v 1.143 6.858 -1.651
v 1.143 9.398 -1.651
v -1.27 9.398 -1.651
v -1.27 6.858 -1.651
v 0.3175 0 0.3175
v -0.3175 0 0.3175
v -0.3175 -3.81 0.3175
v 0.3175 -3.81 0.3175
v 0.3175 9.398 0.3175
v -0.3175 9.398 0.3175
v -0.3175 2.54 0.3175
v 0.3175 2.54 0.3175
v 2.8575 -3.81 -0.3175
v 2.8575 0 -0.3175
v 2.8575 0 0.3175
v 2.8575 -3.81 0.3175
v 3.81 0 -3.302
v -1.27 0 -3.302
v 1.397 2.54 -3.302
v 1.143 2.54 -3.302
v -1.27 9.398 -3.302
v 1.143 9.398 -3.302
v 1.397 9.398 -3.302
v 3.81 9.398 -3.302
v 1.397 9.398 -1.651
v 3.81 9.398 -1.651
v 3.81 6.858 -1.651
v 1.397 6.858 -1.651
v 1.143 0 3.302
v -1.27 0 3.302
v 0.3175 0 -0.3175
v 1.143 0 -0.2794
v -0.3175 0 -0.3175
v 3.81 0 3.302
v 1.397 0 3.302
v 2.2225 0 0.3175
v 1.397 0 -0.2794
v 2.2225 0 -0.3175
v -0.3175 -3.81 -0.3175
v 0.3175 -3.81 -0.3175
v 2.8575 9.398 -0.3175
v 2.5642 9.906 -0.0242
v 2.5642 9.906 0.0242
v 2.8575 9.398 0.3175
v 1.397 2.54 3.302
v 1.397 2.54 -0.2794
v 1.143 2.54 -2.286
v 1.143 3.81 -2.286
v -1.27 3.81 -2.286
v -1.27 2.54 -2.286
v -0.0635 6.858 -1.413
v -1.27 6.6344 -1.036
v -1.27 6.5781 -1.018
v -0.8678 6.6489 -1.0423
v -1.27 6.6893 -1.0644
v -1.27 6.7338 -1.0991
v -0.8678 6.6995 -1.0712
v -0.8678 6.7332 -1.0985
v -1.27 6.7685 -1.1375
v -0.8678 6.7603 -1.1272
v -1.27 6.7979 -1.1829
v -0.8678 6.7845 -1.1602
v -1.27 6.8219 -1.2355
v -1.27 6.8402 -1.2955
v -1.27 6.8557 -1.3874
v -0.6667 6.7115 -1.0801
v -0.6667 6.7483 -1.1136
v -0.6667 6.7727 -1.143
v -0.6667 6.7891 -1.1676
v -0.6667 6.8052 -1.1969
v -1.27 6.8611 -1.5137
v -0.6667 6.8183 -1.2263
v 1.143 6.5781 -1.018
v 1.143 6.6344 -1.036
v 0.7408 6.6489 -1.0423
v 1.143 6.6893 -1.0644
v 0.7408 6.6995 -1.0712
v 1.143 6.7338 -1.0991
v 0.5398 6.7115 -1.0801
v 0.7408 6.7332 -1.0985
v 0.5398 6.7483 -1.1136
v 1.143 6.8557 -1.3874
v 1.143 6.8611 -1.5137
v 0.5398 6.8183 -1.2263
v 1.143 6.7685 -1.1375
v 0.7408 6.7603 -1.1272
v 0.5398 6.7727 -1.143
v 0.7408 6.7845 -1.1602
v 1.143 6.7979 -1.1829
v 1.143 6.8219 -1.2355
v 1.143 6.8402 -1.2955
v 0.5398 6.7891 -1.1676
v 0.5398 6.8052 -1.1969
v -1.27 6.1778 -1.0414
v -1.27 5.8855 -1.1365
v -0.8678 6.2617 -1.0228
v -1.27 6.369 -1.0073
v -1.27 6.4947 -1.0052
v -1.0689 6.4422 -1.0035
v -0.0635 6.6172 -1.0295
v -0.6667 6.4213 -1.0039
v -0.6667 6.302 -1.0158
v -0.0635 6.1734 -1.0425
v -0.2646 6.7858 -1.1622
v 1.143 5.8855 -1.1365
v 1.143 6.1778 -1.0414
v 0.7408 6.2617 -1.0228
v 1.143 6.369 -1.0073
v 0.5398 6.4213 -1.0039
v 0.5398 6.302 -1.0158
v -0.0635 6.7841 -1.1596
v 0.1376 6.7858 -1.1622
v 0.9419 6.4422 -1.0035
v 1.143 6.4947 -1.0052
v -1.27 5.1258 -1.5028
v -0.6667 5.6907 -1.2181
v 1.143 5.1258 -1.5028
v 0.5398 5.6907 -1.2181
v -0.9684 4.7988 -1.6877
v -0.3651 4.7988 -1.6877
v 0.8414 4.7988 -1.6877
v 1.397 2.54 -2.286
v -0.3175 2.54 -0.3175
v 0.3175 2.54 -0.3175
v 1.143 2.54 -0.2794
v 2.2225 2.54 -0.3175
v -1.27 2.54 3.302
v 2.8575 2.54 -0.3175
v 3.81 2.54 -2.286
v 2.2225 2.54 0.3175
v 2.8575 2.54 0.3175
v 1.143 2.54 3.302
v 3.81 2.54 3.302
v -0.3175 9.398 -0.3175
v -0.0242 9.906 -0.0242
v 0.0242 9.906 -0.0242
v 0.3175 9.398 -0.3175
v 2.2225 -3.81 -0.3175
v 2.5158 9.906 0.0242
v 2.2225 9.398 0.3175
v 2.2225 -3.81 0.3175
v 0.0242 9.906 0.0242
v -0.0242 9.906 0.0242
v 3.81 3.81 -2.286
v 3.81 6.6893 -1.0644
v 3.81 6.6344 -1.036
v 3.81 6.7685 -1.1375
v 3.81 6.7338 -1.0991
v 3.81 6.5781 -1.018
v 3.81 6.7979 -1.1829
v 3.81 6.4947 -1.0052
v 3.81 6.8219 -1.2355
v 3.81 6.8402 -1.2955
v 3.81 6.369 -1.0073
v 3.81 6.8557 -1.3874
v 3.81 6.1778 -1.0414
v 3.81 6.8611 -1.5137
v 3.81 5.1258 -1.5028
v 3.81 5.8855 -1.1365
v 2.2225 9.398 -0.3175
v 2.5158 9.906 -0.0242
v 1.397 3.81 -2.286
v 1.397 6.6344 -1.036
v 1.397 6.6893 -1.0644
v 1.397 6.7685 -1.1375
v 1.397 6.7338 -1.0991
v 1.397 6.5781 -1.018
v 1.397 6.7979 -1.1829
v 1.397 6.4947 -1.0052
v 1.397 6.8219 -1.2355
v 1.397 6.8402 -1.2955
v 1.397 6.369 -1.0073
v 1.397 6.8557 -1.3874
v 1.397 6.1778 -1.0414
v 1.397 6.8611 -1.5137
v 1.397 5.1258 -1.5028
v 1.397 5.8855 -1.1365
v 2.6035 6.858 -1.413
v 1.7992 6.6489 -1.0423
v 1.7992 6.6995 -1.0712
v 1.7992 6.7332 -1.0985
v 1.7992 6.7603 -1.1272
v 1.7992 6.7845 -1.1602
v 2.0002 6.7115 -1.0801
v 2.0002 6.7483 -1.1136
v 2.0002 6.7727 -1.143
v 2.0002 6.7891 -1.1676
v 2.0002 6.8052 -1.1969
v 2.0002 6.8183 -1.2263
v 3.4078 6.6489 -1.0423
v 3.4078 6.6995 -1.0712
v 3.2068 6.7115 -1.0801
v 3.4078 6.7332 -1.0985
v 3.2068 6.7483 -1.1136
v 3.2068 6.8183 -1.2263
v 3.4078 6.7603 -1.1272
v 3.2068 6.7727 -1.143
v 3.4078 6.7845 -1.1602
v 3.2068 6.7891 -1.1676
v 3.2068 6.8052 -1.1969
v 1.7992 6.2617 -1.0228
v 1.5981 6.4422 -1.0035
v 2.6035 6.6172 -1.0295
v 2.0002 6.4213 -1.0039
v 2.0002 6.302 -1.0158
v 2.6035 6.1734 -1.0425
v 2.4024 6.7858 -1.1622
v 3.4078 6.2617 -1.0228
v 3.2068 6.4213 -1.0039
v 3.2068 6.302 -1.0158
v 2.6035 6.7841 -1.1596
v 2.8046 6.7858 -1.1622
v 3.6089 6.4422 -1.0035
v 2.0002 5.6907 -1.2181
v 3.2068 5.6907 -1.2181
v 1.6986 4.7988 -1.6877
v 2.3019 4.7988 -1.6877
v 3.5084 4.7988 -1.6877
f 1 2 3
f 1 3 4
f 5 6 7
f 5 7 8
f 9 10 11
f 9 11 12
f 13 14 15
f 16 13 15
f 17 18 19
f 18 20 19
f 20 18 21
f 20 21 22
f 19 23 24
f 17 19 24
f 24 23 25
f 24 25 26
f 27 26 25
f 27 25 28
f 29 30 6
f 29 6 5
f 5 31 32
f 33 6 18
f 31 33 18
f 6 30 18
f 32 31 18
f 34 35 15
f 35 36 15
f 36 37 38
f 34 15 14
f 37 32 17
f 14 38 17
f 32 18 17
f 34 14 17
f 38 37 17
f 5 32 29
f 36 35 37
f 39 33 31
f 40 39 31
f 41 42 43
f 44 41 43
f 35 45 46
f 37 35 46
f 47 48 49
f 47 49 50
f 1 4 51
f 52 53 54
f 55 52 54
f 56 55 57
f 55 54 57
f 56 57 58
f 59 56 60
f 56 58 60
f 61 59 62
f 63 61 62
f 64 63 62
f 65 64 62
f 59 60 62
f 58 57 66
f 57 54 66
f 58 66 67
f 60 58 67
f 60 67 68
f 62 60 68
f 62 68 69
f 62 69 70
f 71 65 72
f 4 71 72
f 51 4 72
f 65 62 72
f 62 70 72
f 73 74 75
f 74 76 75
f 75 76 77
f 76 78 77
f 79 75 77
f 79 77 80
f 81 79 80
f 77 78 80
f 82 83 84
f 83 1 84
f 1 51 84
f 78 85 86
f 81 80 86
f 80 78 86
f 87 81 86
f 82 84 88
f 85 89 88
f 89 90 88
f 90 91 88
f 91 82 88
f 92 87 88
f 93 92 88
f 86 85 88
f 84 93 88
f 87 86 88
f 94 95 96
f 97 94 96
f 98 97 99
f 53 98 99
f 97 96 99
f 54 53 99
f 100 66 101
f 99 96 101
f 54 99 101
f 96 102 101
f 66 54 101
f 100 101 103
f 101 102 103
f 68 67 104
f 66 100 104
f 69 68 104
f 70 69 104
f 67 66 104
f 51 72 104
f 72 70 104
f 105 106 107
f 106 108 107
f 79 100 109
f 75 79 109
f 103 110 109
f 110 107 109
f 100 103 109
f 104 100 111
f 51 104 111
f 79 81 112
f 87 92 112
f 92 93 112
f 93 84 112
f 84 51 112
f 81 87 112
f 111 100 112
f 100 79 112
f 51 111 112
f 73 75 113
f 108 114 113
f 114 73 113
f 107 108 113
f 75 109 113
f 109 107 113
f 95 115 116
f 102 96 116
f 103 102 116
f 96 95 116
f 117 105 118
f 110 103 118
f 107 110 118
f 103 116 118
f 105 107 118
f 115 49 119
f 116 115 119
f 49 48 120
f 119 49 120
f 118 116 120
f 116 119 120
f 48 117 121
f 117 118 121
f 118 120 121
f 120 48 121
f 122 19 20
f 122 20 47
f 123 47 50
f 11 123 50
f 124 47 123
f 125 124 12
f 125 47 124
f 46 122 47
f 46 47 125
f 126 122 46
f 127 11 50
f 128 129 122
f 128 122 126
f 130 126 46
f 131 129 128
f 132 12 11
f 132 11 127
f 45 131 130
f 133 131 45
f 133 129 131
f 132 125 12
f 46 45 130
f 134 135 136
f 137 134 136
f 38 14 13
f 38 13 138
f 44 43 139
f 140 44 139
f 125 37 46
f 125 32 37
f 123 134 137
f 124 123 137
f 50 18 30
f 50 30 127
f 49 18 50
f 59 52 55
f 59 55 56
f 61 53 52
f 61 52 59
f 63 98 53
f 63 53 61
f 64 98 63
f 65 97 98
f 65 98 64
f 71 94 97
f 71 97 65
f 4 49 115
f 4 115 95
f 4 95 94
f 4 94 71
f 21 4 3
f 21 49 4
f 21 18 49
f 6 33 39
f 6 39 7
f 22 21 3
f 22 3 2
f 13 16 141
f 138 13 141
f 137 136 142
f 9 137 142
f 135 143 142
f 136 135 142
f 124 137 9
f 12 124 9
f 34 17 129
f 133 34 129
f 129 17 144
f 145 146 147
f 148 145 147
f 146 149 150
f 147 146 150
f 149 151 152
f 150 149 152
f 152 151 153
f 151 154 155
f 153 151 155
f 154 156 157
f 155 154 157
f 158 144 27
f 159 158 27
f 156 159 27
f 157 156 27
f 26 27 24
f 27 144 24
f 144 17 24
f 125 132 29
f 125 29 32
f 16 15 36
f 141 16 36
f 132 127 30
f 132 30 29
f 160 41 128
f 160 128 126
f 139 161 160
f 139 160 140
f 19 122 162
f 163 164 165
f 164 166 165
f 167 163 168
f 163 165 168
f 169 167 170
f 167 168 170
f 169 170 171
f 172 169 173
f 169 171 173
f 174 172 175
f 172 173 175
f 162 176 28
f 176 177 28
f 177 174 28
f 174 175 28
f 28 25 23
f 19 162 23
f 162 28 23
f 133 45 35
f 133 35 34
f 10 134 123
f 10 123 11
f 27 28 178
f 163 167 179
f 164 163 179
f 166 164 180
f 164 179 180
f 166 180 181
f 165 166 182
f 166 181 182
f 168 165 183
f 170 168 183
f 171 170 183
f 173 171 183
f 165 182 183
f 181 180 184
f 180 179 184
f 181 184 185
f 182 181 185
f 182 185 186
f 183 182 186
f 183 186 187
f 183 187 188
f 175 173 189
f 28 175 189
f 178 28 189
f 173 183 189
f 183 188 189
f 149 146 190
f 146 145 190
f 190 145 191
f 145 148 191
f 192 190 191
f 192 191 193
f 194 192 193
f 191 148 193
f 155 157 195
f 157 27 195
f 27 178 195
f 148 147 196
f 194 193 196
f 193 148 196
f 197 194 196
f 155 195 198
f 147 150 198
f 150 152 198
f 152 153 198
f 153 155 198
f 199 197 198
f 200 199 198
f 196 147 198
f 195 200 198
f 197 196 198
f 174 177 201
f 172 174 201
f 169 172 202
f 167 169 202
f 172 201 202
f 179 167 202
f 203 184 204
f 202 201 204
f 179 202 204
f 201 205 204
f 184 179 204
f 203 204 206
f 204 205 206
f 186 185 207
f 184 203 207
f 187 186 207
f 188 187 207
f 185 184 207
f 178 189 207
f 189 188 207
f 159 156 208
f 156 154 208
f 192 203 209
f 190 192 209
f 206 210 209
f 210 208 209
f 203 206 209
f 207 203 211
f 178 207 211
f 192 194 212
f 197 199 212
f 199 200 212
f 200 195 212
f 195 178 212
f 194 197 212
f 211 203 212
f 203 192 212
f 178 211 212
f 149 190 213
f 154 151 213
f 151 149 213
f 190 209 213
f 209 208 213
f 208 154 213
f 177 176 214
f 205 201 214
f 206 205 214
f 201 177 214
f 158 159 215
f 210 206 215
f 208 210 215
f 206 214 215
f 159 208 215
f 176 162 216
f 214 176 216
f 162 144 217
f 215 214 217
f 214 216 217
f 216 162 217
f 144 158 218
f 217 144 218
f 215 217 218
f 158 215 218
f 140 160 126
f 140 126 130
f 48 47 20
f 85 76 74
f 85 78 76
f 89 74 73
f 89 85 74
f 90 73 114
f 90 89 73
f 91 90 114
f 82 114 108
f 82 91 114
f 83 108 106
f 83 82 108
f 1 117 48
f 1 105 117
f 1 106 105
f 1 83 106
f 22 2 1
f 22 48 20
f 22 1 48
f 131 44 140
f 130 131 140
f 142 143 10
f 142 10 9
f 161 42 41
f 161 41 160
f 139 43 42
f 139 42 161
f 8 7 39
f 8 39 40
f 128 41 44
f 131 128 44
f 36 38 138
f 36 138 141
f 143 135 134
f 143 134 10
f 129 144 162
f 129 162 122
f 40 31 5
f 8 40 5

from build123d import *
from OCP.BRepFilletAPI import BRepFilletAPI_MakeChamfer

# Parameters (mm, degrees)
BASE_EXTRUDE_DEPTH        = 3.302
BASE_EXTRUDE_DEPTH_BACK   = 3.302
SKETCH3_W                 = 5.08
SKETCH3_H                 = 9.398
CUT_EXTRUDE1_START        = -5.08
CUT_EXTRUDE1_DEPTH        = 5.08
SKETCH5_W                 = 3.5814
SKETCH5_H                 = 2.54
CUT_EXTRUDE2_DEPTH        = 0.127
BOSS_EXTRUDE1_START       = -9.906
SKETCH6_W                 = 0.635
SKETCH6_H                 = 0.635
BOSS_EXTRUDE1_DEPTH       = 13.716
CHAMFER1_SIZE             = 0.508
CHAMFER1_SIZE2            = 0.293293937
CHAMFER1_OF_MIRROR1_SIZE  = 0.508
CHAMFER1_OF_MIRROR1_SIZE2 = 0.293293937


# Read off the part's stored shape, not the designer's step: Cut-Extrude1
with BuildPart() as part:
    # Sketch3 → Base-Extrude (new, two sides: drawn at the far end of the back side and taken through both)
    with BuildSketch(Plane.XY.offset(-BASE_EXTRUDE_DEPTH_BACK)):
        with Locations((1.27, 4.699)):
            Rectangle(SKETCH3_W, SKETCH3_H)
    extrude(amount=BASE_EXTRUDE_DEPTH + BASE_EXTRUDE_DEPTH_BACK)

    # Cut-Extrude1 outline → Cut-Extrude1 (cut)
    with BuildSketch(Plane.ZY.offset(1.27).offset(CUT_EXTRUDE1_START)):
        with BuildLine():
            add(Edge.make_bspline(
                [(-2.286, 3.81), (-1.368133743, 5.298530644), (-0.381370103, 6.898794196), (-1.568138006, 6.86066242), (-1.651, 6.858)],
                knots=[0, 0, 0, 0, 0.930178433, 1, 1, 1, 1], degree=3))
            Line((-2.286, 3.81), (-2.286, 2.54))
            Line((-2.286, 2.54), (3.302, 2.54))
            Line((3.302, 2.54), (3.302, 9.398))
            Line((3.302, 9.398), (-1.651, 9.398))
            Line((-1.651, 9.398), (-1.651, 6.858))
        make_face()
    extrude(amount=CUT_EXTRUDE1_DEPTH, mode=Mode.SUBTRACT)

    # Sketch5 → Cut-Extrude2 (cut, symmetric)
    with BuildSketch(Plane(origin=(1.27, 0, 0), x_dir=(0, 0, -1), z_dir=(1, 0, 0))):
        with Locations((-1.5113, 1.27)):
            Rectangle(SKETCH5_W, SKETCH5_H)
        with BuildLine():
            Line((3.302, 2.54), (3.302, 9.398))
            Line((3.302, 9.398), (1.651, 9.398))
            Line((1.651, 9.398), (1.651, 6.858))
            add(Edge.make_bspline(
                [(2.286, 3.81), (1.368133743, 5.298530644), (0.381370103, 6.898794196), (1.568138006, 6.86066242), (1.651, 6.858)],
                knots=[0, 0, 0, 0, 0.930178433, 1, 1, 1, 1], degree=3))
            Line((2.286, 3.81), (2.286, 2.54))
            Line((2.286, 2.54), (3.302, 2.54))
        make_face()
    extrude(amount=CUT_EXTRUDE2_DEPTH, both=True, mode=Mode.SUBTRACT)

    # Sketch6 → Boss-Extrude1 (add)
    with BuildSketch(Plane.XZ.offset(BOSS_EXTRUDE1_START)):
        Rectangle(SKETCH6_W, SKETCH6_H)
    boss_extrude1 = extrude(amount=BOSS_EXTRUDE1_DEPTH)

    # Chamfer1: one chamfer whose edges measure the first distance from different faces: ONE call of the kernel's chamfer builder (chamfer() names one face for all edges)
    chamfer1_edges_1 = [part.edges().sort_by_distance(p)[0] for p in [
        (-0.3175, 9.906, 0),
    ]]
    chamfer1_side_1 = [part.faces().sort_by_distance(p)[0] for p in [
        (-0.3175, 6.223, 0),
    ]]
    chamfer1_edges_2 = [part.edges().sort_by_distance(p)[0] for p in [
        (0, 9.906, -0.3175),
    ]]
    chamfer1_side_2 = [part.faces().sort_by_distance(p)[0] for p in [
        (0, 6.223, -0.3175),
    ]]
    chamfer1_edges_3 = [part.edges().sort_by_distance(p)[0] for p in [
        (0.3175, 9.906, 0),
    ]]
    chamfer1_side_3 = [part.faces().sort_by_distance(p)[0] for p in [
        (0.3175, 6.223, 0),
    ]]
    chamfer1_edges_4 = [part.edges().sort_by_distance(p)[0] for p in [
        (0, 9.906, 0.3175),
    ]]
    chamfer1_side_4 = [part.faces().sort_by_distance(p)[0] for p in [
        (0, 6.223, 0.3175),
    ]]
    chamfer1 = BRepFilletAPI_MakeChamfer(part.part.solid().wrapped)
    for e in chamfer1_edges_1:
        chamfer1.Add(CHAMFER1_SIZE, CHAMFER1_SIZE2, e.wrapped, chamfer1_side_1[0].wrapped)  # the first distance lies on this face
    for e in chamfer1_edges_2:
        chamfer1.Add(CHAMFER1_SIZE, CHAMFER1_SIZE2, e.wrapped, chamfer1_side_2[0].wrapped)  # the first distance lies on this face
    for e in chamfer1_edges_3:
        chamfer1.Add(CHAMFER1_SIZE, CHAMFER1_SIZE2, e.wrapped, chamfer1_side_3[0].wrapped)  # the first distance lies on this face
    for e in chamfer1_edges_4:
        chamfer1.Add(CHAMFER1_SIZE, CHAMFER1_SIZE2, e.wrapped, chamfer1_side_4[0].wrapped)  # the first distance lies on this face
    add(Compound.cast(chamfer1.Shape()), mode=Mode.REPLACE)

    # Mirror1: Boss-Extrude1 across plane
    add(boss_extrude1.mirror(Plane(origin=(1.27, 0, 0), x_dir=(0, 0, 1), z_dir=(1, 0, 0))))

    # Chamfer1 of Mirror1: one chamfer whose edges measure the first distance from different faces: ONE call of the kernel's chamfer builder (chamfer() names one face for all edges)
    chamfer1_of_mirror1_edges_1 = [part.edges().sort_by_distance(p)[0] for p in [
        (2.8575, 9.906, 0),
    ]]
    chamfer1_of_mirror1_side_1 = [part.faces().sort_by_distance(p)[0] for p in [
        (2.8575, 6.223, 0),
    ]]
    chamfer1_of_mirror1_edges_2 = [part.edges().sort_by_distance(p)[0] for p in [
        (2.54, 9.906, -0.3175),
    ]]
    chamfer1_of_mirror1_side_2 = [part.faces().sort_by_distance(p)[0] for p in [
        (2.54, 6.223, -0.3175),
    ]]
    chamfer1_of_mirror1_edges_3 = [part.edges().sort_by_distance(p)[0] for p in [
        (2.2225, 9.906, 0),
    ]]
    chamfer1_of_mirror1_side_3 = [part.faces().sort_by_distance(p)[0] for p in [
        (2.2225, 6.223, 0),
    ]]
    chamfer1_of_mirror1_edges_4 = [part.edges().sort_by_distance(p)[0] for p in [
        (2.54, 9.906, 0.3175),
    ]]
    chamfer1_of_mirror1_side_4 = [part.faces().sort_by_distance(p)[0] for p in [
        (2.54, 6.223, 0.3175),
    ]]
    chamfer1_of_mirror1 = BRepFilletAPI_MakeChamfer(part.part.solid().wrapped)
    for e in chamfer1_of_mirror1_edges_1:
        chamfer1_of_mirror1.Add(CHAMFER1_OF_MIRROR1_SIZE, CHAMFER1_OF_MIRROR1_SIZE2, e.wrapped, chamfer1_of_mirror1_side_1[0].wrapped)  # the first distance lies on this face
    for e in chamfer1_of_mirror1_edges_2:
        chamfer1_of_mirror1.Add(CHAMFER1_OF_MIRROR1_SIZE, CHAMFER1_OF_MIRROR1_SIZE2, e.wrapped, chamfer1_of_mirror1_side_2[0].wrapped)  # the first distance lies on this face
    for e in chamfer1_of_mirror1_edges_3:
        chamfer1_of_mirror1.Add(CHAMFER1_OF_MIRROR1_SIZE, CHAMFER1_OF_MIRROR1_SIZE2, e.wrapped, chamfer1_of_mirror1_side_3[0].wrapped)  # the first distance lies on this face
    for e in chamfer1_of_mirror1_edges_4:
        chamfer1_of_mirror1.Add(CHAMFER1_OF_MIRROR1_SIZE, CHAMFER1_OF_MIRROR1_SIZE2, e.wrapped, chamfer1_of_mirror1_side_4[0].wrapped)  # the first distance lies on this face
    add(Compound.cast(chamfer1_of_mirror1.Shape()), mode=Mode.REPLACE)


solid = part.part
